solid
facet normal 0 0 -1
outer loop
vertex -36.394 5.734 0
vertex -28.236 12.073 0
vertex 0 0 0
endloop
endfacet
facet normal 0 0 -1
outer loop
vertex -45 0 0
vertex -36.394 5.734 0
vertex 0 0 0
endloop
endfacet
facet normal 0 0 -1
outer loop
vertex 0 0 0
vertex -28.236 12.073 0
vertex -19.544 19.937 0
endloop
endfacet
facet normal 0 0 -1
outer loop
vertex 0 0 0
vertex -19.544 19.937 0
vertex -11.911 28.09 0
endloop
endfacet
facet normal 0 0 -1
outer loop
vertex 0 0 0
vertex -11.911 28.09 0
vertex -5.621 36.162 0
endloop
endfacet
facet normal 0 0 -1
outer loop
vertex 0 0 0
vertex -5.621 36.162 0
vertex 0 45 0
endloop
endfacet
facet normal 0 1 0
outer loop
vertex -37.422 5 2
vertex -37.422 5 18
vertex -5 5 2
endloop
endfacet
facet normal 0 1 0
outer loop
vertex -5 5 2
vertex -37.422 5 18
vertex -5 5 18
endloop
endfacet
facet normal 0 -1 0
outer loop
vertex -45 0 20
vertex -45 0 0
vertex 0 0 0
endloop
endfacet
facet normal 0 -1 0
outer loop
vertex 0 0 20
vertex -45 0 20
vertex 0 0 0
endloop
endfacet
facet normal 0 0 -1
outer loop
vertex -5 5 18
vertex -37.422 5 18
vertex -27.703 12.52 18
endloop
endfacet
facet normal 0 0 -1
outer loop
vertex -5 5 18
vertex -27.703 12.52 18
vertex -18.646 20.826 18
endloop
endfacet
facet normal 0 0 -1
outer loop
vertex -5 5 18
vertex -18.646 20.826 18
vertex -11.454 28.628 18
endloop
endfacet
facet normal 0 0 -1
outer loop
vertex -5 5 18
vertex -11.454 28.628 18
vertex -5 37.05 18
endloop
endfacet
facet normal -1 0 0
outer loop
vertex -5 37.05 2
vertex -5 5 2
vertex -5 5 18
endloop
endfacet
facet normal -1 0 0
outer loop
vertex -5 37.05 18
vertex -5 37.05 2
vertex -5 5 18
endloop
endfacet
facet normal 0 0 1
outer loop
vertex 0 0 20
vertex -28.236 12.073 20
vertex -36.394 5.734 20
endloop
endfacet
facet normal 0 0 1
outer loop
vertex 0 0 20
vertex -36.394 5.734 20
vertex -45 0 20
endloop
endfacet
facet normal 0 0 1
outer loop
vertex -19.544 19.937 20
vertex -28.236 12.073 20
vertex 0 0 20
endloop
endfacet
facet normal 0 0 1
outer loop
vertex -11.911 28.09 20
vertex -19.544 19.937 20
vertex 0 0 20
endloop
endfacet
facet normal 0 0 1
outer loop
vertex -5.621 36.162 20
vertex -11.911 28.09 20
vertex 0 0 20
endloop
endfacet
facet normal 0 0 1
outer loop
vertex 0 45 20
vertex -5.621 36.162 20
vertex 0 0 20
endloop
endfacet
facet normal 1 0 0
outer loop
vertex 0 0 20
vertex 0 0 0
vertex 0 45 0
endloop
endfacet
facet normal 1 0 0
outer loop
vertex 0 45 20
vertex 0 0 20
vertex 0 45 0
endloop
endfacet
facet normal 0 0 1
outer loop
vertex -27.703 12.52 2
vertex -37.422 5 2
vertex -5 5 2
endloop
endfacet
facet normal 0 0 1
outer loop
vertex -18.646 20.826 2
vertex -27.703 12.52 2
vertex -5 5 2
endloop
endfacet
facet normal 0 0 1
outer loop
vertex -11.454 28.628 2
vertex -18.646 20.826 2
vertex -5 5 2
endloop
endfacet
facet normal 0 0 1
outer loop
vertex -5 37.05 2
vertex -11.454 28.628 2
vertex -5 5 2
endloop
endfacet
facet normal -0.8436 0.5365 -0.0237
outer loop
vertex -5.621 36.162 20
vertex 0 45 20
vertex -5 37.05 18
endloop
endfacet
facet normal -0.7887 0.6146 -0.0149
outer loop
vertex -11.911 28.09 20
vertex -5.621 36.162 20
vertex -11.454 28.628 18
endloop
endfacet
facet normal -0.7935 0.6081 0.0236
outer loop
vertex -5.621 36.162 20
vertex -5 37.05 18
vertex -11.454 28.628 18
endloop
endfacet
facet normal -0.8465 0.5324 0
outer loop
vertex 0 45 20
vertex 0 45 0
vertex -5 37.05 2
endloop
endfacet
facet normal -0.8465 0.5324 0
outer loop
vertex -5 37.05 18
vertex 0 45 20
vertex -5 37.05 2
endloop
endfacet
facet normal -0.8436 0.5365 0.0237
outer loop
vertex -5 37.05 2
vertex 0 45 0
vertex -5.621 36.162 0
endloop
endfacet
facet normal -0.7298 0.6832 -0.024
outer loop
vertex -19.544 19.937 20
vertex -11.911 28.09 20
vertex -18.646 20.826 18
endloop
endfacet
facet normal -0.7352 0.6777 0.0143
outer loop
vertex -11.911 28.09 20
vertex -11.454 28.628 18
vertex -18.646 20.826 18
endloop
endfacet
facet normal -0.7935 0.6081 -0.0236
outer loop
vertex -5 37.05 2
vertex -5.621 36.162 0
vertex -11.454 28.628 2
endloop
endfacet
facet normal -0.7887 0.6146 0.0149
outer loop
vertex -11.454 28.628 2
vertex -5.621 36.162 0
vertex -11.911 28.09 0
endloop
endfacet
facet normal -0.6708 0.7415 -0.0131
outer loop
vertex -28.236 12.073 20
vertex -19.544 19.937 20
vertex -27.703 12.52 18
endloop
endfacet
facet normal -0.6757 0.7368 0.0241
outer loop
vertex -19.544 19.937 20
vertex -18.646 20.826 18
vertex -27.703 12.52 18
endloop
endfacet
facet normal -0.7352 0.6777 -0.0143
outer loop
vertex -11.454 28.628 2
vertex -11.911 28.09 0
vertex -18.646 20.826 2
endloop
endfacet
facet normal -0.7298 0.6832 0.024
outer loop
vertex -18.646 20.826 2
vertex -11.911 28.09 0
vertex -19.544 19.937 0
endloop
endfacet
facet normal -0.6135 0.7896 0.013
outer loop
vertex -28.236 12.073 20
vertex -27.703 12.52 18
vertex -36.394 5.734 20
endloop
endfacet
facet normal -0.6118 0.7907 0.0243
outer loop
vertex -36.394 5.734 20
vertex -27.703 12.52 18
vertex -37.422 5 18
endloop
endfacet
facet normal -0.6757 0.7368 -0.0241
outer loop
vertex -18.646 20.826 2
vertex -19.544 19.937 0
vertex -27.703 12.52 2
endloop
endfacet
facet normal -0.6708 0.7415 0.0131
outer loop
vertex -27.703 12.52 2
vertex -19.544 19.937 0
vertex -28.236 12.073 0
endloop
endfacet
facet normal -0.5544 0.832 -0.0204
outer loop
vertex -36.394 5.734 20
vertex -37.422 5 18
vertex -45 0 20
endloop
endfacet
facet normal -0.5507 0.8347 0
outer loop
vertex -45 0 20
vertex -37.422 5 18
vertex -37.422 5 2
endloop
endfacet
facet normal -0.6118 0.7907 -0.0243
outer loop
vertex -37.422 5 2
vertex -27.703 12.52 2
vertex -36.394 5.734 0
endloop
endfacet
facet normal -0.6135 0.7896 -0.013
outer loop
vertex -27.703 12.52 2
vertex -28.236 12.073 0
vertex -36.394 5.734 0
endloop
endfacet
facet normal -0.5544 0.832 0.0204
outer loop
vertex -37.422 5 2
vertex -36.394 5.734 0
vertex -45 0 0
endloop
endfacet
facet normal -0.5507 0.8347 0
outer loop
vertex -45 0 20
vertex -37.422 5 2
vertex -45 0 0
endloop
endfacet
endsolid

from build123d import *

# Parameters (mm, degrees)
BOSS_EXTRUDE1_DEPTH = 20
CUT_EXTRUDE1_START  = -5
SKETCH2_W           = 40
SKETCH2_H           = 16
CUT_EXTRUDE1_DEPTH  = 62.708320486


with BuildPart() as part:
    # Sketch1 → Boss-Extrude1 (new body)
    with BuildSketch(Plane.XY):
        with BuildLine():
            Line((0, 0), (0, 45))
            add(Edge.make_bspline(
                [(0, 45), (-6.04309054, 34.377032995), (-19.596555361, 18.290474097), (-36.768954214, 5.047598121), (-45, 0)],
                knots=[0, 0, 0, 0, 0.55, 1, 1, 1, 1], degree=3))
            Line((-45, 0), (0, 0))
        make_face()
    extrude(amount=BOSS_EXTRUDE1_DEPTH)

    # Sketch2 → Cut-Extrude1 (cut, through all)
    with BuildSketch(Plane.XZ.offset(CUT_EXTRUDE1_START)):
        with Locations((-25, 10)):
            Rectangle(SKETCH2_W, SKETCH2_H)
    extrude(amount=-CUT_EXTRUDE1_DEPTH, mode=Mode.SUBTRACT)


solid = part.part
